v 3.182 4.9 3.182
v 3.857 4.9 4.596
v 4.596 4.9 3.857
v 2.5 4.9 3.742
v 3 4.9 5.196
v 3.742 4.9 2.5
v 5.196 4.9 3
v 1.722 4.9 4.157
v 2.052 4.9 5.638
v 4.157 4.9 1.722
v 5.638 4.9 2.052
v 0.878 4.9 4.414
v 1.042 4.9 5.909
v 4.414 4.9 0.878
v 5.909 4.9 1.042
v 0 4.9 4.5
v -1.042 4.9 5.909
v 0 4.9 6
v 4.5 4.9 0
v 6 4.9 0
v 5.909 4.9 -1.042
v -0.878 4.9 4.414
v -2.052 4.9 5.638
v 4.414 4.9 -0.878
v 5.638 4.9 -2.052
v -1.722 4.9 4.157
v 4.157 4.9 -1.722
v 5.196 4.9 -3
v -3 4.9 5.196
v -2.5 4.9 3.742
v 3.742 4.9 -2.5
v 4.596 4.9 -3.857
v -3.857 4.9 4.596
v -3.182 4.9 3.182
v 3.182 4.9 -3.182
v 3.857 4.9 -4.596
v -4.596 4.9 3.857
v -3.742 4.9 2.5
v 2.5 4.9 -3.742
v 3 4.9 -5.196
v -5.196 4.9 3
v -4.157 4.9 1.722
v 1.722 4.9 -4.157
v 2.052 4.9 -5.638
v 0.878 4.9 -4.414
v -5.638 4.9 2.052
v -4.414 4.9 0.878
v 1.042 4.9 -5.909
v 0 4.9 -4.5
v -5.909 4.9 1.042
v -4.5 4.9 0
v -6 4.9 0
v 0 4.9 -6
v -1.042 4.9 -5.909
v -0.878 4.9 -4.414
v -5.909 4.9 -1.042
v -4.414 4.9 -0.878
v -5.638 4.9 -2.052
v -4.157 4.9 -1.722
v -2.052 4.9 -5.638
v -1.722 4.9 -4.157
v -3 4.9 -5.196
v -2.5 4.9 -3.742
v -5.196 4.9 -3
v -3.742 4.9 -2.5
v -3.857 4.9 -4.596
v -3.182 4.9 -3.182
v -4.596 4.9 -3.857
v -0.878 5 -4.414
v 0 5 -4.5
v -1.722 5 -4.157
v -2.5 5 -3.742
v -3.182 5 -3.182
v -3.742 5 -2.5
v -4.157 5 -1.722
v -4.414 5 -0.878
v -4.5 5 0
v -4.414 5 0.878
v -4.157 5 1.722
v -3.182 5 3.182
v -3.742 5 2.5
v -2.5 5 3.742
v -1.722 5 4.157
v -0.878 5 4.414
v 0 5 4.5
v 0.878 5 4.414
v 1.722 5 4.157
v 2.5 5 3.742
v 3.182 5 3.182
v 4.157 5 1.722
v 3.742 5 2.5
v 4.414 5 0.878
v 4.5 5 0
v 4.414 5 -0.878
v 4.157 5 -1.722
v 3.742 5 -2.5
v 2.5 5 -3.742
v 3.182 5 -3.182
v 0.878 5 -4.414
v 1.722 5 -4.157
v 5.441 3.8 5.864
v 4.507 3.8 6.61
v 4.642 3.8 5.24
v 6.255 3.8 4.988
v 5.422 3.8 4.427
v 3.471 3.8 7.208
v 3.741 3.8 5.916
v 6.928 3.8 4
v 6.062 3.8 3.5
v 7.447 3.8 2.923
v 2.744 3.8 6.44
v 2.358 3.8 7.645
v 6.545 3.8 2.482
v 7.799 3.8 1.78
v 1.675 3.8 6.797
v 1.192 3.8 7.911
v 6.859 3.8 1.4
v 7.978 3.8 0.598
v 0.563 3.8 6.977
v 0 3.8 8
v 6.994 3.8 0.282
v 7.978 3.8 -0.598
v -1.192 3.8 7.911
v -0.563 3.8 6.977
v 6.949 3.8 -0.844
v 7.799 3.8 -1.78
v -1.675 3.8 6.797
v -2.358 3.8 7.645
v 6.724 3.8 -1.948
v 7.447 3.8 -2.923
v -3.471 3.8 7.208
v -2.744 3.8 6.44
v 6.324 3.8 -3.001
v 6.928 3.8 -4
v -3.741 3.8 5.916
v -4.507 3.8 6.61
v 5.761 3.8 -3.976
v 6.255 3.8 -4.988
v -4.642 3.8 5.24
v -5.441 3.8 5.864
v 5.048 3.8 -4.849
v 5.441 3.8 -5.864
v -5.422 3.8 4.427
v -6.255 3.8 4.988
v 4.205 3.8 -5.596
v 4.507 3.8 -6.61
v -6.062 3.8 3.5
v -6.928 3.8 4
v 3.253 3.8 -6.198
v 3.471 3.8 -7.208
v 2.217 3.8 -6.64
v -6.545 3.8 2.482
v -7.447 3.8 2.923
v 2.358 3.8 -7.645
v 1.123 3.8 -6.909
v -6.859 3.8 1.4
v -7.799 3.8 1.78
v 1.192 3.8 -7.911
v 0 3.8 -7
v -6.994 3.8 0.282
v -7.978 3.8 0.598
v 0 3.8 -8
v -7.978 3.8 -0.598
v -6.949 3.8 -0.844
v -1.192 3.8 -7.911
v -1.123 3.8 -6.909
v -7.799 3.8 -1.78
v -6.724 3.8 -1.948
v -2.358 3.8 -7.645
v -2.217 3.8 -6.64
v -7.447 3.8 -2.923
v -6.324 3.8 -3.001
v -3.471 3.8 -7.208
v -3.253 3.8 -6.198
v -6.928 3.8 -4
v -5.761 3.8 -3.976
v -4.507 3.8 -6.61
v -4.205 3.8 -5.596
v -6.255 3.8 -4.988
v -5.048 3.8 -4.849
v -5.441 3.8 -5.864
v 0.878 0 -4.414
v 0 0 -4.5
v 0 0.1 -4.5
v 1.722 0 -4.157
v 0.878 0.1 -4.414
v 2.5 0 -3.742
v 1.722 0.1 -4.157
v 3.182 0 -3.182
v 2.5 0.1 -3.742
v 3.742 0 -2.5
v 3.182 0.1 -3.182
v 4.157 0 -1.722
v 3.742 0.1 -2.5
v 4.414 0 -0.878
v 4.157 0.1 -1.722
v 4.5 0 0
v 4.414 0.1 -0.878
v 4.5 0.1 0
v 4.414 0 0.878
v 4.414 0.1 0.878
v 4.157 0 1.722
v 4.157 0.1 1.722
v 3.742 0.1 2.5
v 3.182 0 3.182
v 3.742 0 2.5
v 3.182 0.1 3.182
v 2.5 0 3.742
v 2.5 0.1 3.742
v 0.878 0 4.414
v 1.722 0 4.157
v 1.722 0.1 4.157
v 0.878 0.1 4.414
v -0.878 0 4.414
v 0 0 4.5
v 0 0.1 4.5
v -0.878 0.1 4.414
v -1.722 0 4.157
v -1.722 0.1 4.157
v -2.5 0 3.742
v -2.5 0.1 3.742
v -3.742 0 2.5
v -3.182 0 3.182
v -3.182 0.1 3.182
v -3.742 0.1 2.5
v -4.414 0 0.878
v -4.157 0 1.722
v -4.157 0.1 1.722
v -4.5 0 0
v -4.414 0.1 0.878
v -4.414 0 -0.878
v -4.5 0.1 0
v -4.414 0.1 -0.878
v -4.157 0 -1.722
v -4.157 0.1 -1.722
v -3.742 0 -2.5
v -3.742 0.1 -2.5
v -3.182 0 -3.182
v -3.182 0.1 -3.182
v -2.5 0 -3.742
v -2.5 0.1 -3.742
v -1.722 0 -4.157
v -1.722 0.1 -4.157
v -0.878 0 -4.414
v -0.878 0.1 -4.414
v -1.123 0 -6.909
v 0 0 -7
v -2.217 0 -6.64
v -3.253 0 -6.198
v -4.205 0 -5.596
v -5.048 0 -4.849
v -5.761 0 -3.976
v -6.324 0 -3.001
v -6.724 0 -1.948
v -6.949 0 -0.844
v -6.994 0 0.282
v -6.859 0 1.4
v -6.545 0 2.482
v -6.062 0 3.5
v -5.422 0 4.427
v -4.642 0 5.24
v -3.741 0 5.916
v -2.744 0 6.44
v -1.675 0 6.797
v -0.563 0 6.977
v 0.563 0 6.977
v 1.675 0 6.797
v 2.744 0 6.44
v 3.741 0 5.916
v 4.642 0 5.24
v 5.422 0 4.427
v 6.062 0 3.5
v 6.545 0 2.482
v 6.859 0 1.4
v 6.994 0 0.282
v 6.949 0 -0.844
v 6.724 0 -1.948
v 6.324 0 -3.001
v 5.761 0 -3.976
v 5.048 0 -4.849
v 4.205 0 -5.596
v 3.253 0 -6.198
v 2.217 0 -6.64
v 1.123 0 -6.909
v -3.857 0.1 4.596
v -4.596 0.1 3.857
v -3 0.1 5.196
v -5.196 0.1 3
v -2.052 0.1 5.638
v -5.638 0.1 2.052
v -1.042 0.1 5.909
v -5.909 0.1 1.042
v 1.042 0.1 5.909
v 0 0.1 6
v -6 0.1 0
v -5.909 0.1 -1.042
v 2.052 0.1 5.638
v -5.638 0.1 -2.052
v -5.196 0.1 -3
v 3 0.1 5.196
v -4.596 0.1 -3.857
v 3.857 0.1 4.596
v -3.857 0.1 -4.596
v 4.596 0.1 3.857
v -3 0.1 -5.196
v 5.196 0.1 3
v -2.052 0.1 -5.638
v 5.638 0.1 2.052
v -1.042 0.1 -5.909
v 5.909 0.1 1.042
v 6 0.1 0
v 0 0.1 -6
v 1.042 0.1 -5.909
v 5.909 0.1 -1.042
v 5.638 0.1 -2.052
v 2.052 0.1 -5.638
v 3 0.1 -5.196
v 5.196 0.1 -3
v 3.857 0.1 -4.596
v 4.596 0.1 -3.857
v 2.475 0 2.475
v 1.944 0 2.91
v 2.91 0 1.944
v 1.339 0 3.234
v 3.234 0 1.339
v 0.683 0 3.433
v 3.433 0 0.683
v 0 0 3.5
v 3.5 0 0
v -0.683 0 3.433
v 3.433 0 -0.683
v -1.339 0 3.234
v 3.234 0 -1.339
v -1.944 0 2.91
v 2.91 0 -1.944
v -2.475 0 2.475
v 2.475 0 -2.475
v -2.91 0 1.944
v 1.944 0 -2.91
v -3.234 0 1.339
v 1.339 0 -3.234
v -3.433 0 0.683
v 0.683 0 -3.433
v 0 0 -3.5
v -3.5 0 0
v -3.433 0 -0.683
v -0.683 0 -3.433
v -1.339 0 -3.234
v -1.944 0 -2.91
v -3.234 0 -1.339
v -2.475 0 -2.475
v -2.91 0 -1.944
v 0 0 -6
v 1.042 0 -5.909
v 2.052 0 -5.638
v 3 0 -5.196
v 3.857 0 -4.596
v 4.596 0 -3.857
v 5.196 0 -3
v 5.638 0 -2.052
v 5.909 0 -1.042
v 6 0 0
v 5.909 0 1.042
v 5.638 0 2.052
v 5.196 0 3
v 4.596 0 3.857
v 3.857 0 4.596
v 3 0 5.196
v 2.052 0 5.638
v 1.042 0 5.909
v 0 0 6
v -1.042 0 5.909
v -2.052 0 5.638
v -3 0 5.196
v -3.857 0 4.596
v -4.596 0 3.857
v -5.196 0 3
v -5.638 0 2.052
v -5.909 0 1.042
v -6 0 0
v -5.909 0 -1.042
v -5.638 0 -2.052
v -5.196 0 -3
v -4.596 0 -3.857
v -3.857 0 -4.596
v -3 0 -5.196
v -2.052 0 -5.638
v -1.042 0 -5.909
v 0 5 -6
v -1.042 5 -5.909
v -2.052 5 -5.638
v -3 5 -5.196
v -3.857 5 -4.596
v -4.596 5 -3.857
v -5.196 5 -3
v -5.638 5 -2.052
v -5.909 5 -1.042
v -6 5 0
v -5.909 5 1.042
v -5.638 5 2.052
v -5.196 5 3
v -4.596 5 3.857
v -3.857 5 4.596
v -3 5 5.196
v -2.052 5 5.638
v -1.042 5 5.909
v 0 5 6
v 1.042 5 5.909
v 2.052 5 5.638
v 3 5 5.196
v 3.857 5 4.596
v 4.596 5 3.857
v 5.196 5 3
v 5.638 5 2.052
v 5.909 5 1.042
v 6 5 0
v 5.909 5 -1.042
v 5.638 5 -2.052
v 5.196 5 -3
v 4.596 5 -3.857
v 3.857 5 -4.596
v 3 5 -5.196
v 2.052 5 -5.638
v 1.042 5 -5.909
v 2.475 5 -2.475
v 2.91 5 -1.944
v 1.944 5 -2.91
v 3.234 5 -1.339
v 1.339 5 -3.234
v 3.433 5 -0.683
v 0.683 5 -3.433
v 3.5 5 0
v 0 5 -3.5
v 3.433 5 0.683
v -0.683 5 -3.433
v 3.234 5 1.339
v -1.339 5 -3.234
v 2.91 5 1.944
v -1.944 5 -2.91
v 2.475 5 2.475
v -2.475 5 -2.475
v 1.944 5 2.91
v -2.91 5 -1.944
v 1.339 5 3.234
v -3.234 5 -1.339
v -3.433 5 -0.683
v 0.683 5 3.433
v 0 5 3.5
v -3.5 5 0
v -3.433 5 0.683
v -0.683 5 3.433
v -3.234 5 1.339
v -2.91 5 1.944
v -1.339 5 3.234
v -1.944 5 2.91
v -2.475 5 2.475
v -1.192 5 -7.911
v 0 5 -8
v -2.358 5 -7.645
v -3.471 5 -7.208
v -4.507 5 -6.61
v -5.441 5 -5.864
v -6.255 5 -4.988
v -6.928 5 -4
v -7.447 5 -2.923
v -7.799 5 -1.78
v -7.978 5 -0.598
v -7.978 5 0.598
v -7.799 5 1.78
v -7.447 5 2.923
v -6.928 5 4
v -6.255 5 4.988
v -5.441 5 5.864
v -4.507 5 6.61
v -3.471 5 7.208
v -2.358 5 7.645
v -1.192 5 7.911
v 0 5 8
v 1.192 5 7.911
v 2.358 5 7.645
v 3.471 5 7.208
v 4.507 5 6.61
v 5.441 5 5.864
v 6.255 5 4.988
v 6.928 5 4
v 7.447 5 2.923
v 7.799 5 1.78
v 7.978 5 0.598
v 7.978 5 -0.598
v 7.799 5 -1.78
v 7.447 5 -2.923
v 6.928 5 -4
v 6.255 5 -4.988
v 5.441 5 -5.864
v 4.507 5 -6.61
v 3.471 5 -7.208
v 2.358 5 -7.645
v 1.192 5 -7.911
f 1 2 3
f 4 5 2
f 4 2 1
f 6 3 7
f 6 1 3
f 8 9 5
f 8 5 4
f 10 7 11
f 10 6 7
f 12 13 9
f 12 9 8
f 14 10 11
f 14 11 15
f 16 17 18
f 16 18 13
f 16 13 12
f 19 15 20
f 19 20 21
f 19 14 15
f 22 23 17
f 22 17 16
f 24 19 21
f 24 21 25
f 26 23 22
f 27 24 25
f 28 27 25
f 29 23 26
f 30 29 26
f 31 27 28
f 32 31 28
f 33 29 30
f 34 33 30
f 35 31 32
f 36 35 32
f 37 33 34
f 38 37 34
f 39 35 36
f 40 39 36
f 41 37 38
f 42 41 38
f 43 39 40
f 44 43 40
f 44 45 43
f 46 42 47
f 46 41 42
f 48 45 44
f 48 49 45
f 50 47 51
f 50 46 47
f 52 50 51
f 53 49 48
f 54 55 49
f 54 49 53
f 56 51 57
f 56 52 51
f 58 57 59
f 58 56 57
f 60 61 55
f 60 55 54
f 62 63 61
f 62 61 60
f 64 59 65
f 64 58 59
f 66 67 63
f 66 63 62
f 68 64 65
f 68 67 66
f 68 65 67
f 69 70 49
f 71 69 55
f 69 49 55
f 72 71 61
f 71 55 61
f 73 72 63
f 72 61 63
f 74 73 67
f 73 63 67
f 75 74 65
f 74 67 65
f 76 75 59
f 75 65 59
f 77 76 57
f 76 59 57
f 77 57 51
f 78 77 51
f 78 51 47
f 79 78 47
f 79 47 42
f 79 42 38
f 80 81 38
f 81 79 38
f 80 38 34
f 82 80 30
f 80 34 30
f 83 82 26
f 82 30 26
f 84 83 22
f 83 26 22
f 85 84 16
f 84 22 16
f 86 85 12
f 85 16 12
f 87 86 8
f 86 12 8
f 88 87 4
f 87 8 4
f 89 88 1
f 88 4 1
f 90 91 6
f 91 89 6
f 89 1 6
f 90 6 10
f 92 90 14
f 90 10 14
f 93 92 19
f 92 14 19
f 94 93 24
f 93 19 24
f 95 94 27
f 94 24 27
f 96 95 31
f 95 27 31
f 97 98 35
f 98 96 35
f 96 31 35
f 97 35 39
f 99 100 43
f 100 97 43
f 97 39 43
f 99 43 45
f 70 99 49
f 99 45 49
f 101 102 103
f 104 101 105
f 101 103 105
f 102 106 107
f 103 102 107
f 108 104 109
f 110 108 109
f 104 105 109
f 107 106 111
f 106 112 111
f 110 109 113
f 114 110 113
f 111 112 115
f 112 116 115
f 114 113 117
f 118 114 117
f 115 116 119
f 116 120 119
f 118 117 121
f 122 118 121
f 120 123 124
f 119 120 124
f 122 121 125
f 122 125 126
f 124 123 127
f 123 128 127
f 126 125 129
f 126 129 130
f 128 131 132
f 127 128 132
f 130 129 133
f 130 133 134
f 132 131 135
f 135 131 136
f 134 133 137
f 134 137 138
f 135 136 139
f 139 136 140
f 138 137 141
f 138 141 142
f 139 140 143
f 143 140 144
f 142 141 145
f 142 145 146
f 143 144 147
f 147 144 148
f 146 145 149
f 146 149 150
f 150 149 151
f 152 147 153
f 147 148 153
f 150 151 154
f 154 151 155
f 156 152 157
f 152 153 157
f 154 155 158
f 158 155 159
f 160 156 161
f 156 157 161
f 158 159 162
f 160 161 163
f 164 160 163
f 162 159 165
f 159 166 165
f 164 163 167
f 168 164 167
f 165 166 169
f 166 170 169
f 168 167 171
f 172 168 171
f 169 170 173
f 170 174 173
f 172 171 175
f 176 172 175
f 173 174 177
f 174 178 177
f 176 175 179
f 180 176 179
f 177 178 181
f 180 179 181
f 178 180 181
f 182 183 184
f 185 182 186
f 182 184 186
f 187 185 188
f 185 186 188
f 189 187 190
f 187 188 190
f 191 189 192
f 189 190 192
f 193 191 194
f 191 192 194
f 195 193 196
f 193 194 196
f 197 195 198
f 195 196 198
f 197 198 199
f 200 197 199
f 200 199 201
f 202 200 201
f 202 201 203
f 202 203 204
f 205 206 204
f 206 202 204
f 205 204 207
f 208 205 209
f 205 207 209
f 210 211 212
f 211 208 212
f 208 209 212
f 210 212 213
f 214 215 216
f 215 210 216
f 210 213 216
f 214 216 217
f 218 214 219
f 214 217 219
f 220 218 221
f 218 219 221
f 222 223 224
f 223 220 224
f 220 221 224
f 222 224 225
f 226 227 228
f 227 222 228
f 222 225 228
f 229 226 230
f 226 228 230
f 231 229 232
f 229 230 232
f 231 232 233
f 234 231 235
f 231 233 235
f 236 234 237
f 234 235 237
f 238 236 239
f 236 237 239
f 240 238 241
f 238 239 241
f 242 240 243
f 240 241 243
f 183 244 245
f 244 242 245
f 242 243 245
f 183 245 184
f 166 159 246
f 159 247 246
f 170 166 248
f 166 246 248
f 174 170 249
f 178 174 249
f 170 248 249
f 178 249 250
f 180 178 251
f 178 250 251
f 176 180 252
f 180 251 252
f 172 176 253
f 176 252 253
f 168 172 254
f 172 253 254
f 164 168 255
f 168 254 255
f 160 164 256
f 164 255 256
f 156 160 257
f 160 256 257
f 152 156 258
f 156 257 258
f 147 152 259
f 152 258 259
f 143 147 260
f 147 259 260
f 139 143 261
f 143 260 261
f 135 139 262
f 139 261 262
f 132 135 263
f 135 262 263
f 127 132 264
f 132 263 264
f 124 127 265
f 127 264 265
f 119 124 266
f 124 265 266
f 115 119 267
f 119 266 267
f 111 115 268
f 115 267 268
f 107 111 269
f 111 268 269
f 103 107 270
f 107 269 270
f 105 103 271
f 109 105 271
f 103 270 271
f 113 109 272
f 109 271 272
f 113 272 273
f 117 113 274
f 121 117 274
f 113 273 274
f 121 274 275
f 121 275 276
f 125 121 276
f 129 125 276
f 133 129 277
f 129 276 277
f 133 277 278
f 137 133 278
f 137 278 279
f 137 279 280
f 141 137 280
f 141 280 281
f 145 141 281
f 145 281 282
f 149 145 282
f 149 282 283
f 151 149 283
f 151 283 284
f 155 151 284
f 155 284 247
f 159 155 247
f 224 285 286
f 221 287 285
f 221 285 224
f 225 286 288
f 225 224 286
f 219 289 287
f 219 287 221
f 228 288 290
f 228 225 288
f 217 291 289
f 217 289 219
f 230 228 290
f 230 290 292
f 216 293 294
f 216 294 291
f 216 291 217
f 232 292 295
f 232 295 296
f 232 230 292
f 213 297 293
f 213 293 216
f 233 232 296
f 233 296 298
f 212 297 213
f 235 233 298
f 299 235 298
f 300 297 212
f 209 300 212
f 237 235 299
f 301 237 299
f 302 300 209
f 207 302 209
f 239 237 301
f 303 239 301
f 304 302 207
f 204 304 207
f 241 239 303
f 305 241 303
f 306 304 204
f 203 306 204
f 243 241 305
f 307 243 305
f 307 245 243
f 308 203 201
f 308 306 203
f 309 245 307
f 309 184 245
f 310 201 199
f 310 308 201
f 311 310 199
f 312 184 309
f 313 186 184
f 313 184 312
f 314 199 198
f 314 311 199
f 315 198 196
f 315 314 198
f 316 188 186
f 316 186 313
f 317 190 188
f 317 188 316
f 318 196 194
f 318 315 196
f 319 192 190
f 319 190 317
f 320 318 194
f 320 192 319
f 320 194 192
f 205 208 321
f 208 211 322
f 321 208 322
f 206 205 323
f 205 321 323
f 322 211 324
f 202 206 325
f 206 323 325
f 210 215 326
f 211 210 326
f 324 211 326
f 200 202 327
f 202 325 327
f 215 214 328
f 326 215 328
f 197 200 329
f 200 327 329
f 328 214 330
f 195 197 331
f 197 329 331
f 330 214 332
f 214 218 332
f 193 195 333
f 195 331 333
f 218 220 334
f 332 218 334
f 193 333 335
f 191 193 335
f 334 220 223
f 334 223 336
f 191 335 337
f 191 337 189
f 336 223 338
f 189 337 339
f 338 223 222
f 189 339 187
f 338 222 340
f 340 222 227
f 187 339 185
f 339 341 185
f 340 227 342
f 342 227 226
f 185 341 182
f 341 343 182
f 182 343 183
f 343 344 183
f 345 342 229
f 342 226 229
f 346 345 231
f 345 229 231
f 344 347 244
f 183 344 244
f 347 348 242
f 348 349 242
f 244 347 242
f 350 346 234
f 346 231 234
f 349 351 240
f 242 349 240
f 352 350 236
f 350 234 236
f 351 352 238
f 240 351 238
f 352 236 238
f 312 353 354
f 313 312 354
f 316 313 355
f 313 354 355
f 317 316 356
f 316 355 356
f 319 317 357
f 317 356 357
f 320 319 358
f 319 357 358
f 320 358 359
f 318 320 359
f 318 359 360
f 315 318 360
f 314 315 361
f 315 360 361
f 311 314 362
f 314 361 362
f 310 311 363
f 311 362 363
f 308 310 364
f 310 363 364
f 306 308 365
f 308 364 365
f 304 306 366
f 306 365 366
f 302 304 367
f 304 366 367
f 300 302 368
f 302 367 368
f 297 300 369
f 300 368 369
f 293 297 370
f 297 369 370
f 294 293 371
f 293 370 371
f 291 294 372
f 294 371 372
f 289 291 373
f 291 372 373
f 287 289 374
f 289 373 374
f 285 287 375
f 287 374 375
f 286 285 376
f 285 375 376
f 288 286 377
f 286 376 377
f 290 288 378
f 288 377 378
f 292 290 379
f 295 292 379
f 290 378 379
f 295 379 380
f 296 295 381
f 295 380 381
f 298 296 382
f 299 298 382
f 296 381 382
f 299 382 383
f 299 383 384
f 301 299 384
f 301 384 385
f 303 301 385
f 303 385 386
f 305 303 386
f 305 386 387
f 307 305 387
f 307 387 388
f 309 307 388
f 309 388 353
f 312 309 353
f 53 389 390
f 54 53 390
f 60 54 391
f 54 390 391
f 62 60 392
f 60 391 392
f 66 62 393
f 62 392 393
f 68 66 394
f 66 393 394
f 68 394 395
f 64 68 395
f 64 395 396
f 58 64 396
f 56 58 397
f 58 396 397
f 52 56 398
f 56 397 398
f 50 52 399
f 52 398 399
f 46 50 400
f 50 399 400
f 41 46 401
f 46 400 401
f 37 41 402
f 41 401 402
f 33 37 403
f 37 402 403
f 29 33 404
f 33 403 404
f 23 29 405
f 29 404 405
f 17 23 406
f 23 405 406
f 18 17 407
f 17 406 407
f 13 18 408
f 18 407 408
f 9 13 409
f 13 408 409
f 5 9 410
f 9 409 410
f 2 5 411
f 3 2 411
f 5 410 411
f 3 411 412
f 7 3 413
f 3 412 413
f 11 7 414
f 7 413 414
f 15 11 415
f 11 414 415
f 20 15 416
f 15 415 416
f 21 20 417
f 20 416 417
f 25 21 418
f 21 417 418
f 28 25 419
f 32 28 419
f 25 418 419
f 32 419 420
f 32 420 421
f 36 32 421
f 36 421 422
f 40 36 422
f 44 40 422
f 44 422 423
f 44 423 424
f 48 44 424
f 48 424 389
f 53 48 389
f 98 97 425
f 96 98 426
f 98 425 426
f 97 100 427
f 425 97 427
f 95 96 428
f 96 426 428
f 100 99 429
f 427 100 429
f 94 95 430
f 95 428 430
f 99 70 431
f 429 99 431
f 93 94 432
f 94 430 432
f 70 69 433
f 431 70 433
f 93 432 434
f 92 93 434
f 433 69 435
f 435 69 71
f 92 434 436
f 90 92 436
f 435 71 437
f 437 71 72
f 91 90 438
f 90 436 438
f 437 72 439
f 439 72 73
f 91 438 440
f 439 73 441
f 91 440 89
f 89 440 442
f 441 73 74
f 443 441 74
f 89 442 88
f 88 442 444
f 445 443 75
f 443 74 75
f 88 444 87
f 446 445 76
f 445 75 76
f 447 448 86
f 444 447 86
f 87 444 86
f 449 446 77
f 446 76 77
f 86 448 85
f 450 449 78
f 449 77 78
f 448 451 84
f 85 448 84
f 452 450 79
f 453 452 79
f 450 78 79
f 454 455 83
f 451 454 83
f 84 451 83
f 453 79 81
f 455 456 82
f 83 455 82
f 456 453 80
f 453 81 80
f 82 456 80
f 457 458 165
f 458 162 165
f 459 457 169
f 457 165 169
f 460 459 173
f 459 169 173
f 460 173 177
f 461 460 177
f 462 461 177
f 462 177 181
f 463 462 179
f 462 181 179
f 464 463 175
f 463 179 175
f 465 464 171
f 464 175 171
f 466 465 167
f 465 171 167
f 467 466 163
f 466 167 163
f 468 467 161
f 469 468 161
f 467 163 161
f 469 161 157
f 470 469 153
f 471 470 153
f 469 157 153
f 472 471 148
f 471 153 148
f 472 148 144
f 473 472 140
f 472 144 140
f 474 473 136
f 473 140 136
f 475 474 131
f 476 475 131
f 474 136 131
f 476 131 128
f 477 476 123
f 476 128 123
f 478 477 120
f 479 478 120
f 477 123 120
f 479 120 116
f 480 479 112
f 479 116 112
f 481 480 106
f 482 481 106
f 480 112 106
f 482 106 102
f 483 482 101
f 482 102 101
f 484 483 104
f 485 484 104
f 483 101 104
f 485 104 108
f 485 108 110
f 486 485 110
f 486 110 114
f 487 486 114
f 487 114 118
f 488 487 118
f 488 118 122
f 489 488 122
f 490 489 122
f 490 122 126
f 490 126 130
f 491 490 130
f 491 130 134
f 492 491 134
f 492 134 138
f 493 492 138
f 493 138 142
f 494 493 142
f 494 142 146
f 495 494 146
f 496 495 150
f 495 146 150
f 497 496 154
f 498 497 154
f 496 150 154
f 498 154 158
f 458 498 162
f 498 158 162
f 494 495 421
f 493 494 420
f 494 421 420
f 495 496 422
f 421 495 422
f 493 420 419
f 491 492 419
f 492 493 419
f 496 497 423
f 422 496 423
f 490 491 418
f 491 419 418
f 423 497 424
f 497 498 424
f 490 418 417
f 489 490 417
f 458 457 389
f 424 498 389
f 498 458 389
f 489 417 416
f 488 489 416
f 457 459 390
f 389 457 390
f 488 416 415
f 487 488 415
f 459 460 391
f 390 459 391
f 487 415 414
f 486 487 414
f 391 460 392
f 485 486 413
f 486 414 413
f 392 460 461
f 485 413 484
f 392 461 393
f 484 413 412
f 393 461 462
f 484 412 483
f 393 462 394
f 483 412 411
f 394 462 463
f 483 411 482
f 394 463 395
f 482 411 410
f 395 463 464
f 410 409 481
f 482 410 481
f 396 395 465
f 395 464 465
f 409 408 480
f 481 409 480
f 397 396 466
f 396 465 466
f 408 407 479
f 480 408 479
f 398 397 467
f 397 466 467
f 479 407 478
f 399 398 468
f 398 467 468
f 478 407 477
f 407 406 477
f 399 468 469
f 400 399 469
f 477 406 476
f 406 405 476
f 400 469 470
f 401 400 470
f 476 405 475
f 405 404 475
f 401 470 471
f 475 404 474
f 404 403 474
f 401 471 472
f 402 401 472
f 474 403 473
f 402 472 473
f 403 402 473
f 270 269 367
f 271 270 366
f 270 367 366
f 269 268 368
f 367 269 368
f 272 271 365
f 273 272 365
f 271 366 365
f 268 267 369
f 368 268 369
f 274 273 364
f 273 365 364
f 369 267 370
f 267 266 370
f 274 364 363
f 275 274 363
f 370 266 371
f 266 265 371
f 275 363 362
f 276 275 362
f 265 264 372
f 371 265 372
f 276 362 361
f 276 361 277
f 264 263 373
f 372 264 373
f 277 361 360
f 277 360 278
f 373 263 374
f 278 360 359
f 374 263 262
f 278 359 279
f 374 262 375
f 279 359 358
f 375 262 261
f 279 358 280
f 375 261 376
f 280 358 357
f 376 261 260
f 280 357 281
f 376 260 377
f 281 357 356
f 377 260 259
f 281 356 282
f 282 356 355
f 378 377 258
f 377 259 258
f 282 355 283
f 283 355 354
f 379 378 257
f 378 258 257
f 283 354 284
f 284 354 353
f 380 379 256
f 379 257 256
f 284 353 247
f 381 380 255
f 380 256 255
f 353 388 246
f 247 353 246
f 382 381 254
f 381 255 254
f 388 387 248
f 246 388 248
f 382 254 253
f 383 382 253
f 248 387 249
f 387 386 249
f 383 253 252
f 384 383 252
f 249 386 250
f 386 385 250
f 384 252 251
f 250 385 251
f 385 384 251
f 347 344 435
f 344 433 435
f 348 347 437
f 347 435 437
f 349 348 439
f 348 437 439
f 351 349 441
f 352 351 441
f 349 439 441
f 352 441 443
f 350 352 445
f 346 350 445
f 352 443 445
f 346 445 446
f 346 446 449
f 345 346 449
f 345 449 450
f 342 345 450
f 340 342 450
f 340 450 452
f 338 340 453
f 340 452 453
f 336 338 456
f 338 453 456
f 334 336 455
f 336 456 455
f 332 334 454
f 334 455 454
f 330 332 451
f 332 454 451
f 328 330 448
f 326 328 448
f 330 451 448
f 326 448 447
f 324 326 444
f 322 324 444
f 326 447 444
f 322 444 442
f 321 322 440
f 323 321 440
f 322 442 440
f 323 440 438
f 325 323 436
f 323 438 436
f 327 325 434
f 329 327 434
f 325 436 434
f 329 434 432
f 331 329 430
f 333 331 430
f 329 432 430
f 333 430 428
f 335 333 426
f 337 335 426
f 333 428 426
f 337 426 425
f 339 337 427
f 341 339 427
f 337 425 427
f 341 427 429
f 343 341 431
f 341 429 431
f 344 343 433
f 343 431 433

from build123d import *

# Parameters (mm, degrees)
SKETCH_2_R          = 6
SKETCH_2_R_2        = 4.5
CUT_EXTRUDE_1_DEPTH = 0.1
SKETCH_3_R          = 6
SKETCH_3_R_2        = 4.5
CUT_EXTRUDE_2_DEPTH = 0.1


with BuildPart() as part:
    # 草图1 → 旋转1 (revolve)
    with BuildSketch(Plane.XY, mode=Mode.PRIVATE) as revolve_1_sk:
        Polygon((3.5, 0), (3.5, 5), (8, 5), (8, 3.8), (7, 3.8), (7, 0), align=None)
    revolve(revolve_1_sk.sketch.rotate(Axis((0, 0, 0), (0, 1, 0)), 90), axis=Axis((0, 0, 0), (0, 1, 0)))

    # 草图2 → 切除-拉伸1 (cut, symmetric)
    with BuildSketch(Plane.XZ):
        with Locations(Location((0, 0, 0), (0, 0, 270))):
            Circle(SKETCH_2_R)
        with Locations(Location((0, 0, 0), (0, 0, 270))):
            Circle(SKETCH_2_R_2, mode=Mode.SUBTRACT)
    extrude(amount=CUT_EXTRUDE_1_DEPTH, both=True, mode=Mode.SUBTRACT)

    # 草图3 → 切除-拉伸2 (cut, symmetric)
    with BuildSketch(Plane(origin=(0, 5, 0), x_dir=(1, 0, 0), z_dir=(0, 1, 0))):
        with Locations(Location((0, 0, 0), (0, 0, 90))):
            Circle(SKETCH_3_R)
        with Locations(Location((0, 0, 0), (0, 0, 90))):
            Circle(SKETCH_3_R_2, mode=Mode.SUBTRACT)
    extrude(amount=CUT_EXTRUDE_2_DEPTH, both=True, mode=Mode.SUBTRACT)


solid = part.part
